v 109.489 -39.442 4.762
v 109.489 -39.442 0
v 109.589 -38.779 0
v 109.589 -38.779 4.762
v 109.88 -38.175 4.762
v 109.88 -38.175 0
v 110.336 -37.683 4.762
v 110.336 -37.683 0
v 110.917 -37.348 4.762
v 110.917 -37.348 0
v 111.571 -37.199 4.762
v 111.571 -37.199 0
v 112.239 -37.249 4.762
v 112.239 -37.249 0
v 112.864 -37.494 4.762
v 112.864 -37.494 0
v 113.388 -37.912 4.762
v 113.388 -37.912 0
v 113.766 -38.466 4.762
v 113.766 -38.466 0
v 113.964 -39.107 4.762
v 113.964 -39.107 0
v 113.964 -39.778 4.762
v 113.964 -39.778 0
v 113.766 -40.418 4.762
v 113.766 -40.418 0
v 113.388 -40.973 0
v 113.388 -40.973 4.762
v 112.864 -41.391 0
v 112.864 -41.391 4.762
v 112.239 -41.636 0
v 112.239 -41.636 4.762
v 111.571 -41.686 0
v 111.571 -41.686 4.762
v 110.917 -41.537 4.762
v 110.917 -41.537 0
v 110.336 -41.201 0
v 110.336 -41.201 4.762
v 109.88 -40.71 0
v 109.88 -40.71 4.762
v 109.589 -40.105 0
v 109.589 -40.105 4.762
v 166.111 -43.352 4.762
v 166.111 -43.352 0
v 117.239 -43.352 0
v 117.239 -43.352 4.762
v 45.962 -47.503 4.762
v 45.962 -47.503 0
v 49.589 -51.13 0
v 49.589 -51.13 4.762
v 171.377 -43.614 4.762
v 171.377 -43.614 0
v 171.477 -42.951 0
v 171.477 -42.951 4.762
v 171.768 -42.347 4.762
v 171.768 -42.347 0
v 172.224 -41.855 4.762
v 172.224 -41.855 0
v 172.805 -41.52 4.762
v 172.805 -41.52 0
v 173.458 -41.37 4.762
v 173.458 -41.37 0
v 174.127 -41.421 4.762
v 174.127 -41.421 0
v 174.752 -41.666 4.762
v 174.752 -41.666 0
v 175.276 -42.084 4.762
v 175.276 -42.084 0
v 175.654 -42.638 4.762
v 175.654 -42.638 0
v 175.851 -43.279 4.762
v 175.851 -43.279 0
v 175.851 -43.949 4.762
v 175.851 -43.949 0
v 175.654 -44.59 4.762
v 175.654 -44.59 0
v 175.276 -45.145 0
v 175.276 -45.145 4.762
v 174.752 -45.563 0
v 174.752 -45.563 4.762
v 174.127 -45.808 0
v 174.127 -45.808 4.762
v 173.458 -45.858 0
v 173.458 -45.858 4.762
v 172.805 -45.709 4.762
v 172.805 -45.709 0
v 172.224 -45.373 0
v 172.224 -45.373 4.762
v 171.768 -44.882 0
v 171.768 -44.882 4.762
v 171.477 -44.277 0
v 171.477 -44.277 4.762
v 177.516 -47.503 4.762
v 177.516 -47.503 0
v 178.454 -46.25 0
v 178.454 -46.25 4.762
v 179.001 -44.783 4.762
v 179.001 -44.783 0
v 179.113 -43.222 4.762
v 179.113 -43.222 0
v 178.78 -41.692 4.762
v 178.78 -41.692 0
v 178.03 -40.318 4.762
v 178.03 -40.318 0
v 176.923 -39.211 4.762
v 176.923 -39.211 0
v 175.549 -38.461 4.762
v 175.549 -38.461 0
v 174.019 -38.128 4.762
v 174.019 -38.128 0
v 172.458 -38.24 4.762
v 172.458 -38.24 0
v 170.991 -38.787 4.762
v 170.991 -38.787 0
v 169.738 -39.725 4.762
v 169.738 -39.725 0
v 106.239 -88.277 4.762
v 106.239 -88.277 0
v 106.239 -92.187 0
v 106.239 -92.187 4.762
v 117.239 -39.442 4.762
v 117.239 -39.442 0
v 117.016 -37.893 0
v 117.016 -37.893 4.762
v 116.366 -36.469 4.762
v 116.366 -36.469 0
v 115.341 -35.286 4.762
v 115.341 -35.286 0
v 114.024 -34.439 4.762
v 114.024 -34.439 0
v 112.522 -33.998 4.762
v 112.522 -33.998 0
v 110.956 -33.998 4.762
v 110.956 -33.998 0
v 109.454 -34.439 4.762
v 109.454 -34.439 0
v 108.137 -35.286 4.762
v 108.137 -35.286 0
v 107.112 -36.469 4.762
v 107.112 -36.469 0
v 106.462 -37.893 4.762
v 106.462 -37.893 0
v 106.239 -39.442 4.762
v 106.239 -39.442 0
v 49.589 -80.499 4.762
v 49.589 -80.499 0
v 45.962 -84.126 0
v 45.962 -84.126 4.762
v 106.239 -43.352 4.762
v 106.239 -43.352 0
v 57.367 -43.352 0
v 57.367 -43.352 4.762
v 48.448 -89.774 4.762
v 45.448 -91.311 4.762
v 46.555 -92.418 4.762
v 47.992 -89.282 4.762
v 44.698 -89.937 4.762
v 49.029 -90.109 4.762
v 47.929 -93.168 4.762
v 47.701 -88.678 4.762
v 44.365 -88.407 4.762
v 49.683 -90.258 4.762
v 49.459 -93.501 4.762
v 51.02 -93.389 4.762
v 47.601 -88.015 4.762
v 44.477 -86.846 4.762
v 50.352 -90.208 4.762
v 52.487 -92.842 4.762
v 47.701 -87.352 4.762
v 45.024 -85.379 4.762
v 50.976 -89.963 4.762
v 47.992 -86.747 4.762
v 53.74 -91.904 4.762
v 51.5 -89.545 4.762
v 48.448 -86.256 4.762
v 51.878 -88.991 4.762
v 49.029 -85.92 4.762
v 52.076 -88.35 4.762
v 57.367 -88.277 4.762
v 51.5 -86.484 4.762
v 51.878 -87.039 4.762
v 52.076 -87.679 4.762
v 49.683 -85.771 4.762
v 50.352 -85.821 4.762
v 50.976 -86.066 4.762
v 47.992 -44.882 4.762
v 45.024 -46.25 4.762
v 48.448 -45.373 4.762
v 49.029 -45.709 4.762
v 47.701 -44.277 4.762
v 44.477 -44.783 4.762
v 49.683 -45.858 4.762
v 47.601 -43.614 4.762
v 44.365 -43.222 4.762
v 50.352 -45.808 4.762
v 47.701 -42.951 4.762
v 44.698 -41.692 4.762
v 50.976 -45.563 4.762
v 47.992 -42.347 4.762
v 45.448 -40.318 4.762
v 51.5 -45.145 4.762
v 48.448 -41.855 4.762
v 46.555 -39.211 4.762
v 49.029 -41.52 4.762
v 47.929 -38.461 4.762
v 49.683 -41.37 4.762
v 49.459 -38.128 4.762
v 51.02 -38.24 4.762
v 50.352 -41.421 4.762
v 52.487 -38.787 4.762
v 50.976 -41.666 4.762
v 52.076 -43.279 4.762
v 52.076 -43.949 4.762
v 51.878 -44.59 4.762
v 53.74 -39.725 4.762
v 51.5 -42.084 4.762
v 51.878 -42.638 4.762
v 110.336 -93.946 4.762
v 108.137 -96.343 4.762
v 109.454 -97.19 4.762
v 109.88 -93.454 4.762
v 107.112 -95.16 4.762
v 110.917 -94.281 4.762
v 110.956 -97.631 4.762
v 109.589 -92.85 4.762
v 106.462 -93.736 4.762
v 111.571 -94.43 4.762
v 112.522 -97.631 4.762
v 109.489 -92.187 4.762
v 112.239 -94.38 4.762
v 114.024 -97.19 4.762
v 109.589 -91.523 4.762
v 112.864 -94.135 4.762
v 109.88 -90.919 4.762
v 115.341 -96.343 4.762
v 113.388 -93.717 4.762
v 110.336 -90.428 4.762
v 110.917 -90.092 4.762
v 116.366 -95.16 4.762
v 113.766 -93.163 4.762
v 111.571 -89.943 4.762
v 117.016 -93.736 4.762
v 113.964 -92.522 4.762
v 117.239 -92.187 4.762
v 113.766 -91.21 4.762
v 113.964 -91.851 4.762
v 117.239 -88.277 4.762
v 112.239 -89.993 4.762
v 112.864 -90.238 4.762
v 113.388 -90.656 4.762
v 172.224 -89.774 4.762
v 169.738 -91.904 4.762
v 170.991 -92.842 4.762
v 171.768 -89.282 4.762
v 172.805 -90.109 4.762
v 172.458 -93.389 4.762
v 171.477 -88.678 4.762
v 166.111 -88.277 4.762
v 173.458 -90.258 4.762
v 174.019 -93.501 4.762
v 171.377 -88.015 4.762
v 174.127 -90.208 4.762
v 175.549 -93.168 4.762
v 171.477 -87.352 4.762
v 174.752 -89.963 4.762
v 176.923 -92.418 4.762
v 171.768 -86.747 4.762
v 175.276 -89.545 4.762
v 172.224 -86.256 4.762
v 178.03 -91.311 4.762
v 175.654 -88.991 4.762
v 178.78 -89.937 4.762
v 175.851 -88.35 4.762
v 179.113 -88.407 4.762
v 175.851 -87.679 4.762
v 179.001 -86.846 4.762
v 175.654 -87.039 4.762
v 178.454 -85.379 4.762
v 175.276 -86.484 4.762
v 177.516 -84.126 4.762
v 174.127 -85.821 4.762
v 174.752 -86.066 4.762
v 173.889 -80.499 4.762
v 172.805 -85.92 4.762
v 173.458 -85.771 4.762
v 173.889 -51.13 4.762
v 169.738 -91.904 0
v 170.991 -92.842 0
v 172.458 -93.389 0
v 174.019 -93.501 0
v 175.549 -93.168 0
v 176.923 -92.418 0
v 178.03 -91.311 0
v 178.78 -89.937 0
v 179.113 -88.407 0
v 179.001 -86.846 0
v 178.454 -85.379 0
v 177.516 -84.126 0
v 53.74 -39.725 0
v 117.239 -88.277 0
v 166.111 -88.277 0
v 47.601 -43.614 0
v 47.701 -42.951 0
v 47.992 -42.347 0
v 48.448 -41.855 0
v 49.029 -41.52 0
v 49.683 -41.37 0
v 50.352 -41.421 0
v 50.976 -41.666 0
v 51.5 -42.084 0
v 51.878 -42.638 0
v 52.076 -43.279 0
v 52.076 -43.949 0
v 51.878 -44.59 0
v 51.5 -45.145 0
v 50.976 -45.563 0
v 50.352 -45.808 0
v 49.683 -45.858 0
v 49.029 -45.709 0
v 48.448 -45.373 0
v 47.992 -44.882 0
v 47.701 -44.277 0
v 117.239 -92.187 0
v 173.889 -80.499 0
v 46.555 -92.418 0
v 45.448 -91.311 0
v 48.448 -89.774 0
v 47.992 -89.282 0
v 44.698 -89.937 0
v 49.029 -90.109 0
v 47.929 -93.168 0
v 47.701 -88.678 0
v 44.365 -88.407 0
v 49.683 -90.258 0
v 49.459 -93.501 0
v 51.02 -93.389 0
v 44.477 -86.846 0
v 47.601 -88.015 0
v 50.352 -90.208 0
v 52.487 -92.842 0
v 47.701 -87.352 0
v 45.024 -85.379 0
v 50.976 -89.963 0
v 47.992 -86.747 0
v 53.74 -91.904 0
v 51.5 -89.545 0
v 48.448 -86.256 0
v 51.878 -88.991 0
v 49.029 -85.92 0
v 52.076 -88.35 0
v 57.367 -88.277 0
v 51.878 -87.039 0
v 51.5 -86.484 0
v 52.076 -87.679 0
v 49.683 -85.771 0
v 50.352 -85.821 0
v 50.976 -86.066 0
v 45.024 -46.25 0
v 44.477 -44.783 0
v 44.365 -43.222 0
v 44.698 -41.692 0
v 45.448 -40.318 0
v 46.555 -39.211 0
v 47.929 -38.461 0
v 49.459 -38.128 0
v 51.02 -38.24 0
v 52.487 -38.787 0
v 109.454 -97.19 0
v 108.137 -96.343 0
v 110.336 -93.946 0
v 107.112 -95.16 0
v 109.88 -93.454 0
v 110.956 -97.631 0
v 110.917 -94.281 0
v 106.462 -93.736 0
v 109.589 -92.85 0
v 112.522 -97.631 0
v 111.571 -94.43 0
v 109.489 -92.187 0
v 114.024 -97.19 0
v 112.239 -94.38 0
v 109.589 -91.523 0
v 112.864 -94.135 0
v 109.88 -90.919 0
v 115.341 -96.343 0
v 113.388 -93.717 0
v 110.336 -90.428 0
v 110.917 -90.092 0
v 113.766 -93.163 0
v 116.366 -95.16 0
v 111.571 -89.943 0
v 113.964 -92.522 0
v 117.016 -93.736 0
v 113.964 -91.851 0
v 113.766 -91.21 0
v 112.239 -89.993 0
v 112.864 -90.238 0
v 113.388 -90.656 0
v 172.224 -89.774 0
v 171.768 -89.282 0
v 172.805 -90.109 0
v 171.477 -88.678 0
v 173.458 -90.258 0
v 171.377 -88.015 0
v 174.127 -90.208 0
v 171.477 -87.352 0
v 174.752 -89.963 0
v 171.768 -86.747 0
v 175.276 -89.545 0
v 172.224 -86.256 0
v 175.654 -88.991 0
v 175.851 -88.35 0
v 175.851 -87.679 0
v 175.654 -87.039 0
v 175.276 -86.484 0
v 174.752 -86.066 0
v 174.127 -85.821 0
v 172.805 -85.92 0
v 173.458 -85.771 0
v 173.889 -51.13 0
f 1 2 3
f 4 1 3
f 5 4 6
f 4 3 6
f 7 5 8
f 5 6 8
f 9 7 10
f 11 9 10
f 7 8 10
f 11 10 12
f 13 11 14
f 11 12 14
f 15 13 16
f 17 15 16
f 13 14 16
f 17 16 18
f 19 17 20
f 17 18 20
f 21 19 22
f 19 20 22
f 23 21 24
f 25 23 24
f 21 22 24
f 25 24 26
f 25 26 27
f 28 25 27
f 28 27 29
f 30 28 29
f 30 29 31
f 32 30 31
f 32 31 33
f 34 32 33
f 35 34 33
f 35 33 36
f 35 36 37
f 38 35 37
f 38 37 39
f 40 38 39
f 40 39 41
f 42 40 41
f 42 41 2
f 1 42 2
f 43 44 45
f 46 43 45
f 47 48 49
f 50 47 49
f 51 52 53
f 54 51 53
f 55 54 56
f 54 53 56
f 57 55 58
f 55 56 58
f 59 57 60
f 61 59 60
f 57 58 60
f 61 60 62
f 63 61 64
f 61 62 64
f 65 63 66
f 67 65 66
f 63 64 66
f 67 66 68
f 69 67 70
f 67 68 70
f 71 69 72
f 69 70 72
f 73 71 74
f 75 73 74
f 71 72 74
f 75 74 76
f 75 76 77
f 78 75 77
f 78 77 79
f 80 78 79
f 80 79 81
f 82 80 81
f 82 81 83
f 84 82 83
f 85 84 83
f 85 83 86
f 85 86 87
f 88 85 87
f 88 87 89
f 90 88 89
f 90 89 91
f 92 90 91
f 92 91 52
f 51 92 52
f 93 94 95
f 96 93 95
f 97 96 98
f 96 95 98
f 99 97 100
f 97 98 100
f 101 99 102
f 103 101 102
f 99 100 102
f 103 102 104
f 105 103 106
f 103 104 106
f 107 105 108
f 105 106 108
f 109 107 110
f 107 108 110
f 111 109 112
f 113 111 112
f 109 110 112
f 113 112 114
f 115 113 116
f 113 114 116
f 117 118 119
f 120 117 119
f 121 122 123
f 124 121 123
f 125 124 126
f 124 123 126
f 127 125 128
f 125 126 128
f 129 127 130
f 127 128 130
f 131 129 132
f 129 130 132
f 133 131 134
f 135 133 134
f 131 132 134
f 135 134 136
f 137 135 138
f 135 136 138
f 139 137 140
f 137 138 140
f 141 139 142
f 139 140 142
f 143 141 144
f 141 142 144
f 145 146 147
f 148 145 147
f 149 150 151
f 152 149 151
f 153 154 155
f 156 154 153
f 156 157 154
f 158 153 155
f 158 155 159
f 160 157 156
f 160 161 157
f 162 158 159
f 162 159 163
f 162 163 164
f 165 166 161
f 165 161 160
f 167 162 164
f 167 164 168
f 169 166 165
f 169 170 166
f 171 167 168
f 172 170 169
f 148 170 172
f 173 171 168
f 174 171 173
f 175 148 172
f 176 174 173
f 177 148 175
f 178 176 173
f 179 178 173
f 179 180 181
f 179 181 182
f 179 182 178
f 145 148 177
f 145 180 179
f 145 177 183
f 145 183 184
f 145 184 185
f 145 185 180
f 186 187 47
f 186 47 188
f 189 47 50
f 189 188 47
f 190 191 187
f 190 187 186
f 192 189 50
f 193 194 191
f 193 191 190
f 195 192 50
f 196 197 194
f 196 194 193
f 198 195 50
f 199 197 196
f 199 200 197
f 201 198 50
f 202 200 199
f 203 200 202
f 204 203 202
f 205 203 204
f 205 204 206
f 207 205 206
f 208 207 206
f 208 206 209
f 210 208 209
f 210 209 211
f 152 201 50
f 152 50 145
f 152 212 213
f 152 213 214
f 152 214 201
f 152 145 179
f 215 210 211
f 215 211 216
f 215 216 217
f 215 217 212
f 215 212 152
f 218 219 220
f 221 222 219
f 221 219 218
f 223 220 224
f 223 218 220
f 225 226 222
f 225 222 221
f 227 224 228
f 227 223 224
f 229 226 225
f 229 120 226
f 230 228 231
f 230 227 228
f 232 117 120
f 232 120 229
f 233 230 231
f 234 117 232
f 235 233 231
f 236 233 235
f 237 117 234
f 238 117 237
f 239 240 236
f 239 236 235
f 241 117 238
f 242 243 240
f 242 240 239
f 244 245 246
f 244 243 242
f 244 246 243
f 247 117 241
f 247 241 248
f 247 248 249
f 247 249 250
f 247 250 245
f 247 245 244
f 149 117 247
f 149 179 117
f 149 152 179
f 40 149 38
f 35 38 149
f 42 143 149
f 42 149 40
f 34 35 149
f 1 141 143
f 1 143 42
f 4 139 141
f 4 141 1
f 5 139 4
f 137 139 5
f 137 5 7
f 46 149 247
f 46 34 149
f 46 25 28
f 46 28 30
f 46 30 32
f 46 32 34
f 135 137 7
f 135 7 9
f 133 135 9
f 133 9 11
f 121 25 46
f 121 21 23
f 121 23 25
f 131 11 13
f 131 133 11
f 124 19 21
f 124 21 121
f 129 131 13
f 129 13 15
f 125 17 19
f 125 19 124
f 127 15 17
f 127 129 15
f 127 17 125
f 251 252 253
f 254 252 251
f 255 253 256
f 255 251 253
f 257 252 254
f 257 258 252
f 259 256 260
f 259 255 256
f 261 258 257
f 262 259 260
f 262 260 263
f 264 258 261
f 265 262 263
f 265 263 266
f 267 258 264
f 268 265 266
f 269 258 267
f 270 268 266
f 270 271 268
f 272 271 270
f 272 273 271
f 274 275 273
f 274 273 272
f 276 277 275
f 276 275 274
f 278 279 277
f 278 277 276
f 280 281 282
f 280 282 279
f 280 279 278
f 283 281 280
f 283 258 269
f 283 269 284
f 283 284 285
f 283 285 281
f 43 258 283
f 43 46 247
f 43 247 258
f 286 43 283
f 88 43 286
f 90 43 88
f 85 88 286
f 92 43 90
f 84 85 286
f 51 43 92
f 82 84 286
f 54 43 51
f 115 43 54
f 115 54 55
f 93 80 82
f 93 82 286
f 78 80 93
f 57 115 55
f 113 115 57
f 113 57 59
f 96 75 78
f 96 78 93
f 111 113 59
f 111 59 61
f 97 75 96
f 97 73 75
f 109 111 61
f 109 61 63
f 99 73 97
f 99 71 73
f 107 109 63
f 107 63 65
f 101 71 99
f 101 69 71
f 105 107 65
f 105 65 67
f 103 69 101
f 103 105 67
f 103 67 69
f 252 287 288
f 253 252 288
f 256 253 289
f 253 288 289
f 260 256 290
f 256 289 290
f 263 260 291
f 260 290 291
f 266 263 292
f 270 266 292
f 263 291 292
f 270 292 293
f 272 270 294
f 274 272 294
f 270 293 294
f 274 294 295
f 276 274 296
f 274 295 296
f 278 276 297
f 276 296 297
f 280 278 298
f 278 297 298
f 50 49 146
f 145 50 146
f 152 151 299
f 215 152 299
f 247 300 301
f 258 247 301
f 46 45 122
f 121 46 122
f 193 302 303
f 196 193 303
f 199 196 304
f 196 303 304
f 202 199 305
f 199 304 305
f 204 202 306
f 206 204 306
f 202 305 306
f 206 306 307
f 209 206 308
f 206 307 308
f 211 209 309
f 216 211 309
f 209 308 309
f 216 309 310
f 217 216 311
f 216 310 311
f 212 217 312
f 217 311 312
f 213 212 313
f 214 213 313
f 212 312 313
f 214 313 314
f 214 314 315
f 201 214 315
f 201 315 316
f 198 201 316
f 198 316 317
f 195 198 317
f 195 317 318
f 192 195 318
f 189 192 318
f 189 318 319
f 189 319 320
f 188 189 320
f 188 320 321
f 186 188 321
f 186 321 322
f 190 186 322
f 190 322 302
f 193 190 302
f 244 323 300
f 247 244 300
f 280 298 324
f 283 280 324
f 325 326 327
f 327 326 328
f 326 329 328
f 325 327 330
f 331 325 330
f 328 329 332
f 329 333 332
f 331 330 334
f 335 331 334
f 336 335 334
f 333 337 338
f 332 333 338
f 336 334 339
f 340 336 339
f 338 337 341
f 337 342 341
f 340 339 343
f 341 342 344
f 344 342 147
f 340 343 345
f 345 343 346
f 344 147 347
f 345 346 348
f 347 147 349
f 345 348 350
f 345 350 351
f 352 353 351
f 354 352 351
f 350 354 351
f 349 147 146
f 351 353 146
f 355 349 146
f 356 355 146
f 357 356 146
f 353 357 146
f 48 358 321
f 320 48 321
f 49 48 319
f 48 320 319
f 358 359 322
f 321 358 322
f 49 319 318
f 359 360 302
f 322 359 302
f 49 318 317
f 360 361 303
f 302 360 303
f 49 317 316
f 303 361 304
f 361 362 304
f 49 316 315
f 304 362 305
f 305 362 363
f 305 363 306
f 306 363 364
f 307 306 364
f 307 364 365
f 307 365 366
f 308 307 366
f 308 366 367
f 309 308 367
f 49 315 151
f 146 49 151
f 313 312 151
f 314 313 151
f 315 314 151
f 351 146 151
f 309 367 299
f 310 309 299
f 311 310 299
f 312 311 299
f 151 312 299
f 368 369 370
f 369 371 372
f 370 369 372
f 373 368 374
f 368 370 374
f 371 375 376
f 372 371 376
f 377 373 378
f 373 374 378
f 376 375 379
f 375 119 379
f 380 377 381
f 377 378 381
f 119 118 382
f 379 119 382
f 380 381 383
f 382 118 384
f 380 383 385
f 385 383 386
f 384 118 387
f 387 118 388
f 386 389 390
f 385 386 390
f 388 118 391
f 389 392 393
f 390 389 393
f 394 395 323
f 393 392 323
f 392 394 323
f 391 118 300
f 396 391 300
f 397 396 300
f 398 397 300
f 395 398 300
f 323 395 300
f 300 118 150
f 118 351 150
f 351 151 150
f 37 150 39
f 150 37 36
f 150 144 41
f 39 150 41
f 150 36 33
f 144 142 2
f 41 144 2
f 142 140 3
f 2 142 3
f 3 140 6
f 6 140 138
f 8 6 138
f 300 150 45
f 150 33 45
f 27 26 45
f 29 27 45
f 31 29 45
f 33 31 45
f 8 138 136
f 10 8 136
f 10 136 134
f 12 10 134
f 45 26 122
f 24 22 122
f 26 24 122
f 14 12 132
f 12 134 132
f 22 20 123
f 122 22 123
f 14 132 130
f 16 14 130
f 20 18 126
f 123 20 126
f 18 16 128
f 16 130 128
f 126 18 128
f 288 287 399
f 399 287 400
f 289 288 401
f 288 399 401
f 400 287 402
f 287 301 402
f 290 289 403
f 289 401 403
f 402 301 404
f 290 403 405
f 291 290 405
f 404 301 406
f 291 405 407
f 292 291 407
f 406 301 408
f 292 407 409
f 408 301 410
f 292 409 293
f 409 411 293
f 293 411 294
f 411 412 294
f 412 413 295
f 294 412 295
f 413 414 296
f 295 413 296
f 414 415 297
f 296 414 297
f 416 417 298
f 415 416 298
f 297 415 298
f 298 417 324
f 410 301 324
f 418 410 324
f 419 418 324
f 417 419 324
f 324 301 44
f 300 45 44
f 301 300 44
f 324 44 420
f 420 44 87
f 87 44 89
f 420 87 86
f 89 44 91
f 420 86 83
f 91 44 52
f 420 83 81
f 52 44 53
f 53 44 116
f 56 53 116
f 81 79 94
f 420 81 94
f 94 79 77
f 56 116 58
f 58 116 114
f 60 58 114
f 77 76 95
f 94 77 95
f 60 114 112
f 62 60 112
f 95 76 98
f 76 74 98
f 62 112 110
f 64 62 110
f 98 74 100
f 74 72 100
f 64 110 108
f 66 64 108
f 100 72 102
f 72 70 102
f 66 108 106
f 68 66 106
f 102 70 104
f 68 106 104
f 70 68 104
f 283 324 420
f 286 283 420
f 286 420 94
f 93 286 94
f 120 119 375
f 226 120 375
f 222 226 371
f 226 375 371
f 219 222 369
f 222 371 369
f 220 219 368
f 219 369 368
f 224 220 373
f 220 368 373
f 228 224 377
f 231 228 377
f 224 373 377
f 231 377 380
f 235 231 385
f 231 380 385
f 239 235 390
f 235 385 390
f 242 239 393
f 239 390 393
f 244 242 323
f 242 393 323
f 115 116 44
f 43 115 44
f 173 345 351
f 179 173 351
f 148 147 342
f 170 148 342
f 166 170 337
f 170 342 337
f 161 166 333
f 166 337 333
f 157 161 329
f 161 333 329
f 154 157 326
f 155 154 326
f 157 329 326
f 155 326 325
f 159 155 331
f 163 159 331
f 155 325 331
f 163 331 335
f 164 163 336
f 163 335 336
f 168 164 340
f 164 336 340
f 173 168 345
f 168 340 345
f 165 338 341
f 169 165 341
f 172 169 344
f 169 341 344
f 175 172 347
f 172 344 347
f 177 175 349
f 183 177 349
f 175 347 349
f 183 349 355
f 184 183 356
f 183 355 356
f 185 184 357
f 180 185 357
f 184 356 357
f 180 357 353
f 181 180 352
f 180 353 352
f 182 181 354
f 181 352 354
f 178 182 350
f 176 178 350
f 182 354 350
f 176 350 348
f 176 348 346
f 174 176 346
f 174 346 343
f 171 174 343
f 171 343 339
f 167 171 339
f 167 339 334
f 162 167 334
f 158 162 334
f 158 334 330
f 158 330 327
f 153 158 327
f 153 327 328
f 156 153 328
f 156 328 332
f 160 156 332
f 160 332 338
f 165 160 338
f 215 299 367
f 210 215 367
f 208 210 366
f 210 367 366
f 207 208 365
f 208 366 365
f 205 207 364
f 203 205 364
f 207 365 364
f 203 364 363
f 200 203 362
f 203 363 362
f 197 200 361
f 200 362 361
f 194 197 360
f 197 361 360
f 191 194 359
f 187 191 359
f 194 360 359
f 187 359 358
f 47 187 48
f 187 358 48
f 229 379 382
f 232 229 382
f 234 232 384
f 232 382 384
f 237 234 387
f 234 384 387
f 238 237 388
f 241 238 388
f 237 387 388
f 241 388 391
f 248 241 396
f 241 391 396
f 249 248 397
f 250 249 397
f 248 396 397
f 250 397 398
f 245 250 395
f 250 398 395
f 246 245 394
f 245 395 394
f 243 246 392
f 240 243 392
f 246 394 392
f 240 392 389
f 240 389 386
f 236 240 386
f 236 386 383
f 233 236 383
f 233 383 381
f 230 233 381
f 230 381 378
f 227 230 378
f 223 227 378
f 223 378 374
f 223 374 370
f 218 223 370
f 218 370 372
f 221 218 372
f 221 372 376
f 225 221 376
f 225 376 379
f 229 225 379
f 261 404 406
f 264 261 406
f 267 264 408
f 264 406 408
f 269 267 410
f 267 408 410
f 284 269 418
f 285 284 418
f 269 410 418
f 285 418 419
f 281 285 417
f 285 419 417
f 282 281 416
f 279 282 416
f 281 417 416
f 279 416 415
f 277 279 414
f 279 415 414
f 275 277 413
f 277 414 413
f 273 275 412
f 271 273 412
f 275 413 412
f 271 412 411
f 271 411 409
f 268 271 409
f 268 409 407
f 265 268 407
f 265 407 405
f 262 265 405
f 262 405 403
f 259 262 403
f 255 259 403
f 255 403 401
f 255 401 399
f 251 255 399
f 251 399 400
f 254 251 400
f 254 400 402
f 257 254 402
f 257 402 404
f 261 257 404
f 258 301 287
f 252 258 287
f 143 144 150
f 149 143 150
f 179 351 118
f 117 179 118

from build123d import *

# Parameters (mm, degrees)
BOSS_EXTRUDE1_DEPTH  = 4.7625
M4_CLEARANCE_HOLE1_D = 4.5


with BuildPart() as part:
    # Sketch1 → Boss-Extrude1 (new body)
    with BuildSketch(Plane.XY):
        with BuildLine():
            Line((166.110631803, -43.351929971), (117.238806396, -43.351929971))
            Line((117.238806396, -43.351929971), (117.238806396, -39.442229971))
            ThreePointArc((117.238806396, -39.442229971), (111.738806396, -33.942229971), (106.238806396, -39.442229971))
            Line((106.238806396, -39.442229971), (106.238806396, -43.351929971))
            Line((106.238806396, -43.351929971), (57.366980989, -43.351929971))
            Line((57.366980989, -43.351929971), (53.740076833, -39.725025815))
            ThreePointArc((53.740076833, -39.725025815), (45.96190224, -39.725025815), (45.96190224, -47.503200408))
            Line((45.96190224, -47.503200408), (49.588806396, -51.130104564))
            Line((49.588806396, -51.130104564), (49.588806396, -80.498755377))
            Line((49.588806396, -80.498755377), (45.96190224, -84.125659533))
            ThreePointArc((45.96190224, -84.125659533), (45.96190224, -91.903834126), (53.740076833, -91.903834126))
            Line((53.740076833, -91.903834126), (57.366980989, -88.276929971))
            Line((57.366980989, -88.276929971), (106.238806396, -88.276929971))
            Line((106.238806396, -88.276929971), (106.238806396, -92.186629971))
            ThreePointArc((106.238806396, -92.186629971), (111.738806396, -97.686629971), (117.238806396, -92.186629971))
            Line((117.238806396, -92.186629971), (117.238806396, -88.276929971))
            Line((117.238806396, -88.276929971), (166.110631803, -88.276929971))
            Line((166.110631803, -88.276929971), (169.737535958, -91.903834126))
            ThreePointArc((169.737535958, -91.903834126), (177.515710552, -91.903834126), (177.515710552, -84.125659533))
            Line((177.515710552, -84.125659533), (173.888806396, -80.498755377))
            Line((173.888806396, -80.498755377), (173.888806396, -51.130104564))
            Line((173.888806396, -51.130104564), (177.515710552, -47.503200408))
            ThreePointArc((177.515710552, -47.503200408), (177.515710552, -39.725025815), (169.737535958, -39.725025815))
            Line((169.737535958, -39.725025815), (166.110631803, -43.351929971))
        make_face()
    extrude(amount=BOSS_EXTRUDE1_DEPTH)

    # M4 Clearance Hole1 (through all)
    with Locations(Plane.XY.offset(4.7625)):
        with Locations((111.738806396, -39.442229971), (173.626623255, -43.614113111), (173.626623255, -88.01474683), (111.738806396, -92.186629971), (49.850989537, -88.01474683), (49.850989537, -43.614113111)):
            Hole(M4_CLEARANCE_HOLE1_D / 2)


solid = part.part
